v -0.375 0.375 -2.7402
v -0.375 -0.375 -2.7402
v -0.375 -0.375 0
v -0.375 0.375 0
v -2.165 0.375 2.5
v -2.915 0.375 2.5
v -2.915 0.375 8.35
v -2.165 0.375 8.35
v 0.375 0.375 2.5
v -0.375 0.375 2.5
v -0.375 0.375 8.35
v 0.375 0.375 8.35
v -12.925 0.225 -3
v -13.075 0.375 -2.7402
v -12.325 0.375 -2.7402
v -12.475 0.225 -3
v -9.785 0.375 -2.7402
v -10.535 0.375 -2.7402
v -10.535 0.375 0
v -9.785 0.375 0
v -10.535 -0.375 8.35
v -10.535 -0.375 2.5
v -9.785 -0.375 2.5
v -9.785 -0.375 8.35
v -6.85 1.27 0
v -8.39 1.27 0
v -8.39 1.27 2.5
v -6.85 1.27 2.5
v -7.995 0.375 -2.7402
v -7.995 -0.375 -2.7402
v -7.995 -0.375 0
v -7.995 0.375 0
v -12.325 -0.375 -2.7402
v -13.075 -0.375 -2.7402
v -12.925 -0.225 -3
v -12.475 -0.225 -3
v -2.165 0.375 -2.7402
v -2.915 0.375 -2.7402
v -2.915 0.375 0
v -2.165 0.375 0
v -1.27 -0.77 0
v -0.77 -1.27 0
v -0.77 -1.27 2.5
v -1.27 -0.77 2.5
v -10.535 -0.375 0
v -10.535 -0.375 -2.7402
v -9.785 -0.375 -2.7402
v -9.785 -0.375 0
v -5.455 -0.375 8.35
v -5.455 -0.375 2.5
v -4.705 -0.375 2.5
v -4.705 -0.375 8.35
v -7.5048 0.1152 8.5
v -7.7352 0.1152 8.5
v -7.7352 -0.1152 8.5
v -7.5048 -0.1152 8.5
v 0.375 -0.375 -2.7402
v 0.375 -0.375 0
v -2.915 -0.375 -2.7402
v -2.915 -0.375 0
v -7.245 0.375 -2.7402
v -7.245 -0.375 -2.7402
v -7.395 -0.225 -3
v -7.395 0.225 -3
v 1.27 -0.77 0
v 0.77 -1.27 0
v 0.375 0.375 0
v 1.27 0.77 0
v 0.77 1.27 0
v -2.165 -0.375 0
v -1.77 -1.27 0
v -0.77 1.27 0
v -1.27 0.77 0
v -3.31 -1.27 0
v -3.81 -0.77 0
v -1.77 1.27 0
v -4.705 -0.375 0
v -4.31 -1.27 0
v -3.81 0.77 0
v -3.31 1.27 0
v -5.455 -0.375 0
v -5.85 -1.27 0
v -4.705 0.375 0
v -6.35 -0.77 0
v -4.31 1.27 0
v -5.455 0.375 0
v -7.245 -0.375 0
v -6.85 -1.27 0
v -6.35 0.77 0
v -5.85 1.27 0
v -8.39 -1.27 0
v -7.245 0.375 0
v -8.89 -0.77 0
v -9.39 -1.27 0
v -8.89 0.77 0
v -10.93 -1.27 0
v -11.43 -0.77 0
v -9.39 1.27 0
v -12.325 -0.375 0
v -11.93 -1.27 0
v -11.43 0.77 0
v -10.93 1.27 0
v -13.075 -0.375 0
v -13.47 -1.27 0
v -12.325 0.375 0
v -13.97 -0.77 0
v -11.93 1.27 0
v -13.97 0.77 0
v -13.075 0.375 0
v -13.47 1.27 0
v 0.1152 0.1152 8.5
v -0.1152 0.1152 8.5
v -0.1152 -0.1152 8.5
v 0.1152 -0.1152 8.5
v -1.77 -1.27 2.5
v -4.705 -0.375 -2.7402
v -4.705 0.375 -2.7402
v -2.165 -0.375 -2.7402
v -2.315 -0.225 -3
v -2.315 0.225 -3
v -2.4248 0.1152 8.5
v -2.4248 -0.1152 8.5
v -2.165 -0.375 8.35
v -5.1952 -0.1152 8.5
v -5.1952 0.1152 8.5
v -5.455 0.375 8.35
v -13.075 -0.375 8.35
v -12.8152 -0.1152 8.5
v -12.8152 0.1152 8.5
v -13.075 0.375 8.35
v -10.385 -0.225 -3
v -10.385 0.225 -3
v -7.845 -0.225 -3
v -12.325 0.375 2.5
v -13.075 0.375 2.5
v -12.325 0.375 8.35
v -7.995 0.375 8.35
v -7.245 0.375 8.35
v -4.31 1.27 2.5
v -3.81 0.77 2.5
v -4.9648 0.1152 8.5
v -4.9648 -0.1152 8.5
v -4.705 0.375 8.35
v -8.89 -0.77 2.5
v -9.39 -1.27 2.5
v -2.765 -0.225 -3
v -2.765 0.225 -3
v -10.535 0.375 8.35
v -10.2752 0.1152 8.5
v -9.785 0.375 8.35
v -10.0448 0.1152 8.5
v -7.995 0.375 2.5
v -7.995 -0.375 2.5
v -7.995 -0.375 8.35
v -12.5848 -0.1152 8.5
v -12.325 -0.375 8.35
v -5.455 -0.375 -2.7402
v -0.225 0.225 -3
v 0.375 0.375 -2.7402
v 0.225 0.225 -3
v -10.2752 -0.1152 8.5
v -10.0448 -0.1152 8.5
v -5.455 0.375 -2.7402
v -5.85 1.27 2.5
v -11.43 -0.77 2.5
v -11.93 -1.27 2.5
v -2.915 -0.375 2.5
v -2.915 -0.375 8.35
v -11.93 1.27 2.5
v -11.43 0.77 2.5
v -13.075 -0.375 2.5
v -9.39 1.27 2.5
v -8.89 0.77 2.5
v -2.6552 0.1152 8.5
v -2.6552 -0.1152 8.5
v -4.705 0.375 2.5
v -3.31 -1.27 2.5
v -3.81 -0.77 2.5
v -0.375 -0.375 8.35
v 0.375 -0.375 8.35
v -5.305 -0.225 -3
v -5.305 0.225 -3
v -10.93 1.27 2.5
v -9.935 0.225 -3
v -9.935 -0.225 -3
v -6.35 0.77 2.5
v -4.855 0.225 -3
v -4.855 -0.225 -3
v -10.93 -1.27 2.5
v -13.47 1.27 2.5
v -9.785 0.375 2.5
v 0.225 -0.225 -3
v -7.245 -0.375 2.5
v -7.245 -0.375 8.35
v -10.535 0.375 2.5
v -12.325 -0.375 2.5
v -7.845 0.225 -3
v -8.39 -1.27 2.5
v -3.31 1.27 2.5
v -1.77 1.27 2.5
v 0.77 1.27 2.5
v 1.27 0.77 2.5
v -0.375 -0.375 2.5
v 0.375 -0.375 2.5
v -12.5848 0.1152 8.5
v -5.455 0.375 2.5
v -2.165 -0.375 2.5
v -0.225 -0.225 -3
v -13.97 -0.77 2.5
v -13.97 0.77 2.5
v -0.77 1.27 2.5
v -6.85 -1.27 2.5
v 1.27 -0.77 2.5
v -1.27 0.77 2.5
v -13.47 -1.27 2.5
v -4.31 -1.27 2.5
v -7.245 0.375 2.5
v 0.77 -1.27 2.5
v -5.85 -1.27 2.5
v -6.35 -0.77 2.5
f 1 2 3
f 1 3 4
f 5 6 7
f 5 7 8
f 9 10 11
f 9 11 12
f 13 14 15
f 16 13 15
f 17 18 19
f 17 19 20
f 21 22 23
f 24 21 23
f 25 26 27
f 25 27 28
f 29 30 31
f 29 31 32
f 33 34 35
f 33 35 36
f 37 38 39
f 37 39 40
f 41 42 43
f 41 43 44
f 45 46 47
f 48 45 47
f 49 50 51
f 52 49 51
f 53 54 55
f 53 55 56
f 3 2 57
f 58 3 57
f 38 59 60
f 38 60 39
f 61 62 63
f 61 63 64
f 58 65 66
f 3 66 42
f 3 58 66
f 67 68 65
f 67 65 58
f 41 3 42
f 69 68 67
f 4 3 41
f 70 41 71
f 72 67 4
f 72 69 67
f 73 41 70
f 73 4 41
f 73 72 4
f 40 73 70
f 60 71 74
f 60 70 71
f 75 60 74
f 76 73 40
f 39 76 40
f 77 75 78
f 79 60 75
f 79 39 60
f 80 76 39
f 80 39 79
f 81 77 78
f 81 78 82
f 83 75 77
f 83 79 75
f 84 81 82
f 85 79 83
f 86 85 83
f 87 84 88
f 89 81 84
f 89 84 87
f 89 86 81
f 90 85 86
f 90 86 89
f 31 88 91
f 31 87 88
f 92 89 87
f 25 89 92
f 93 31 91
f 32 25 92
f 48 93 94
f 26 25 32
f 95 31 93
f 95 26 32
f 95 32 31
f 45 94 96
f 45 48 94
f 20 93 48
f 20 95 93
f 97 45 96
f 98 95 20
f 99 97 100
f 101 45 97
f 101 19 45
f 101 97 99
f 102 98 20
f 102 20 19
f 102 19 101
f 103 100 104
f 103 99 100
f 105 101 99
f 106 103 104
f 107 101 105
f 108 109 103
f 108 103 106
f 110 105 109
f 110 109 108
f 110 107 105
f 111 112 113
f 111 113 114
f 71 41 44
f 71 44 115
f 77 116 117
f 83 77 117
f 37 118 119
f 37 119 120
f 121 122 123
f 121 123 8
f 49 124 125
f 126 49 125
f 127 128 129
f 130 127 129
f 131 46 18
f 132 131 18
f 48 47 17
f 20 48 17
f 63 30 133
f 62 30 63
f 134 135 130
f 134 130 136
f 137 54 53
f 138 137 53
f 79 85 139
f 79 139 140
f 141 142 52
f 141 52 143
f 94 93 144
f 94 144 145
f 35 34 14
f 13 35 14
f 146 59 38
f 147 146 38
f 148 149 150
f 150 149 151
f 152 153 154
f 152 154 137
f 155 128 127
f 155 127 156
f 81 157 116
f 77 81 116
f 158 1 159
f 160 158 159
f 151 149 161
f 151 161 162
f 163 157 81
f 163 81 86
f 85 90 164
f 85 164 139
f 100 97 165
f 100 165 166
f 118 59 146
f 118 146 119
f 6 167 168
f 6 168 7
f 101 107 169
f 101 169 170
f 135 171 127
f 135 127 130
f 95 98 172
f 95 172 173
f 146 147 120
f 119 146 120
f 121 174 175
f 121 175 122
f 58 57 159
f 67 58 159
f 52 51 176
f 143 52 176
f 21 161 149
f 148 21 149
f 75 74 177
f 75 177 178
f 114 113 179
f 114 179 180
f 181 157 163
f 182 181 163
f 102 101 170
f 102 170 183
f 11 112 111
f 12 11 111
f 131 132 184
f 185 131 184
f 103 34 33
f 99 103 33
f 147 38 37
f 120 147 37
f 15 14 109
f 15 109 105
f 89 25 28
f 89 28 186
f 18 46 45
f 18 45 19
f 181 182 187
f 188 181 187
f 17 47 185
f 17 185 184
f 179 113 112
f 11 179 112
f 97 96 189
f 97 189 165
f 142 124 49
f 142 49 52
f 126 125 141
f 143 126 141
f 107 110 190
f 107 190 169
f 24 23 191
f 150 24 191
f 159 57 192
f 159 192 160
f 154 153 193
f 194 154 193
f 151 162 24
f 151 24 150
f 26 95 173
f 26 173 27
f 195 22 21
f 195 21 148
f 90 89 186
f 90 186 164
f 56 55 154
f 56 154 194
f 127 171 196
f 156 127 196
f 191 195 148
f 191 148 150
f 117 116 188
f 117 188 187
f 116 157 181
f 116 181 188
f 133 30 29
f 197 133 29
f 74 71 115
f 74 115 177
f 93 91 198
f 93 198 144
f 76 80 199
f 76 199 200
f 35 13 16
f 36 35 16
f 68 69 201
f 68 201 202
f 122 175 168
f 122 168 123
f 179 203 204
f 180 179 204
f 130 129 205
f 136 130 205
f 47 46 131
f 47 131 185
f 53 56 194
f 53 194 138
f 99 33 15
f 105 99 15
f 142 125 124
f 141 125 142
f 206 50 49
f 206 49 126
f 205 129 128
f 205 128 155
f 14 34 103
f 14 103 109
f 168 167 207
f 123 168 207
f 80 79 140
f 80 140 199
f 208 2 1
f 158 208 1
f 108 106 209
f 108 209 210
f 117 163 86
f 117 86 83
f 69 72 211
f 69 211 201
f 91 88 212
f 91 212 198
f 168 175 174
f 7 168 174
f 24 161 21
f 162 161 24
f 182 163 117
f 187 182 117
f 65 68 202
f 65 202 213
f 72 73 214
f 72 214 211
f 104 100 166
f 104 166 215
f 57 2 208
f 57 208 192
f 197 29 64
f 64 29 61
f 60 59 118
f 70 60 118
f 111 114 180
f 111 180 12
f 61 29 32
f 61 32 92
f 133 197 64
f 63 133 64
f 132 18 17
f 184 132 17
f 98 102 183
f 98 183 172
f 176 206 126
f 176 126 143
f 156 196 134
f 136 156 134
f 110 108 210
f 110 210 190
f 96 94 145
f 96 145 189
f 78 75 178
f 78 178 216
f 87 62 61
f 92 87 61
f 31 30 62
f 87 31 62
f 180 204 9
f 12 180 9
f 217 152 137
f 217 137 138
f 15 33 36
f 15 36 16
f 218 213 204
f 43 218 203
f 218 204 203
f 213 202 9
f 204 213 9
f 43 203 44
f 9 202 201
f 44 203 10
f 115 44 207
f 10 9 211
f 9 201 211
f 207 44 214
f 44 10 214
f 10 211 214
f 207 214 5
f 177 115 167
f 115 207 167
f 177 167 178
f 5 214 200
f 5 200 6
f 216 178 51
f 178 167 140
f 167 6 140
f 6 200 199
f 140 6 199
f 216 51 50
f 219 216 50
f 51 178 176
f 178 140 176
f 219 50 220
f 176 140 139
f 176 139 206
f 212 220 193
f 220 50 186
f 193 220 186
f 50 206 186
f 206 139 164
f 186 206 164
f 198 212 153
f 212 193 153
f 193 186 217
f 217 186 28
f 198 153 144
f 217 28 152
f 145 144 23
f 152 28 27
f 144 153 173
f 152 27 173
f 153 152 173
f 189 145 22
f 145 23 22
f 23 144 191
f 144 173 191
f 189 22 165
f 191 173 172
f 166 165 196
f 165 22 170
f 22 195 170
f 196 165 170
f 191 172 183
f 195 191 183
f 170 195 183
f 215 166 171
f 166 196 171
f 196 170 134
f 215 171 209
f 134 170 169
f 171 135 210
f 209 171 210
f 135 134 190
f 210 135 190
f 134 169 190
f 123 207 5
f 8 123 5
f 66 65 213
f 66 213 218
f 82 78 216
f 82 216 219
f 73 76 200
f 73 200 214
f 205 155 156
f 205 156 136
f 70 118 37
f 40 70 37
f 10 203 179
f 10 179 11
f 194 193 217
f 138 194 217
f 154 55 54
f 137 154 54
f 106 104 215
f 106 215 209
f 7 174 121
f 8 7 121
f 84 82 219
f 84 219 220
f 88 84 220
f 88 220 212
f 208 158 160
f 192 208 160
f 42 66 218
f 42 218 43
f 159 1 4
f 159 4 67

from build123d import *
from OCP.BRepFilletAPI import BRepFilletAPI_MakeChamfer

# Parameters (mm, degrees)
SKICA1_W                     = 0.75
SKICA1_H                     = 0.75
P_IDAT_VYSUNUT_M1_DEPTH      = 2.5
LINPOLE3_COUNT               = 6
LINPOLE3_PITCH               = 2.54
P_IDAT_VYSUNUT_M2_DEPTH      = 6
P_IDAT_VYSUNUT_M2_DEPTH_BACK = 5.5
SKICA2_W                     = 0.75
SKICA2_H                     = 0.75
ZKOSEN_2_SIZE                = 0.15
ZKOSEN_2_SIZE2               = 0.259807621


with BuildPart() as part:
    # Skica1 → Přidat vysunutím1 (new body)
    with BuildSketch(Plane.XY):
        Polygon((0.77, 1.27), (1.27, 0.77), (1.27, -0.77), (0.77, -1.27), (-0.77, -1.27), (-1.27, -0.77), (-1.27, 0.77), (-0.77, 1.27), align=None)
        Rectangle(SKICA1_W, SKICA1_H, mode=Mode.SUBTRACT)
    p_idat_vysunut_m1 = extrude(amount=P_IDAT_VYSUNUT_M1_DEPTH)

    # LinPole3: Přidat vysunutím1 ×6
    with Locations(*[(-i * LINPOLE3_PITCH, 0, 0) for i in range(1, LINPOLE3_COUNT)]):
        add(p_idat_vysunut_m1)

    # Skica2 → Přidat vysunutím2 (add, two sides: drawn at the far end of the back side and taken through both)
    with BuildSketch(Plane.XY.offset(2.5).offset(-P_IDAT_VYSUNUT_M2_DEPTH_BACK)):
        with Locations((-12.7, 0)):
            Rectangle(SKICA2_W, SKICA2_H)
        with Locations((-10.16, 0)):
            Rectangle(SKICA2_W, SKICA2_H)
        with Locations((-7.62, 0)):
            Rectangle(SKICA2_W, SKICA2_H)
        with Locations((-5.08, 0)):
            Rectangle(SKICA2_W, SKICA2_H)
        with Locations((-2.54, 0)):
            Rectangle(SKICA2_W, SKICA2_H)
        Rectangle(SKICA2_W, SKICA2_H)
    extrude(amount=P_IDAT_VYSUNUT_M2_DEPTH + P_IDAT_VYSUNUT_M2_DEPTH_BACK)

    # Zkosení2: one chamfer whose edges measure the first distance from different faces: ONE call of the kernel's chamfer builder (chamfer() names one face for all edges)
    zkosen_2_edges_1 = [part.edges().sort_by_distance(p)[0] for p in [
        (0, 0.375, -3),
        (0.375, 0, -3),
        (0, -0.375, -3),
        (-0.375, 0, -3),
    ]]
    zkosen_2_side_1 = [part.faces().sort_by_distance(p)[0] for p in [
        (0, 0, -3),
    ]]
    zkosen_2_edges_2 = [part.edges().sort_by_distance(p)[0] for p in [
        (0, 0.375, 8.5),
    ]]
    zkosen_2_side_2 = [part.faces().sort_by_distance(p)[0] for p in [
        (0, 0.375, 5.5),
    ]]
    zkosen_2_edges_3 = [part.edges().sort_by_distance(p)[0] for p in [
        (-0.375, 0, 8.5),
    ]]
    zkosen_2_side_3 = [part.faces().sort_by_distance(p)[0] for p in [
        (-0.375, 0, 5.5),
    ]]
    zkosen_2_edges_4 = [part.edges().sort_by_distance(p)[0] for p in [
        (0, -0.375, 8.5),
    ]]
    zkosen_2_side_4 = [part.faces().sort_by_distance(p)[0] for p in [
        (0, -0.375, 5.5),
    ]]
    zkosen_2_edges_5 = [part.edges().sort_by_distance(p)[0] for p in [
        (0.375, 0, 8.5),
    ]]
    zkosen_2_side_5 = [part.faces().sort_by_distance(p)[0] for p in [
        (0.375, 0, 5.5),
    ]]
    zkosen_2_edges_6 = [part.edges().sort_by_distance(p)[0] for p in [
        (-2.54, 0.375, -3),
        (-2.165, 0, -3),
        (-2.54, -0.375, -3),
        (-2.915, 0, -3),
    ]]
    zkosen_2_side_6 = [part.faces().sort_by_distance(p)[0] for p in [
        (-2.54, 0, -3),
    ]]
    zkosen_2_edges_7 = [part.edges().sort_by_distance(p)[0] for p in [
        (-2.54, 0.375, 8.5),
    ]]
    zkosen_2_side_7 = [part.faces().sort_by_distance(p)[0] for p in [
        (-2.54, 0.375, 5.5),
    ]]
    zkosen_2_edges_8 = [part.edges().sort_by_distance(p)[0] for p in [
        (-2.915, 0, 8.5),
    ]]
    zkosen_2_side_8 = [part.faces().sort_by_distance(p)[0] for p in [
        (-2.915, 0, 5.5),
    ]]
    zkosen_2_edges_9 = [part.edges().sort_by_distance(p)[0] for p in [
        (-2.54, -0.375, 8.5),
    ]]
    zkosen_2_side_9 = [part.faces().sort_by_distance(p)[0] for p in [
        (-2.54, -0.375, 5.5),
    ]]
    zkosen_2_edges_10 = [part.edges().sort_by_distance(p)[0] for p in [
        (-2.165, 0, 8.5),
    ]]
    zkosen_2_side_10 = [part.faces().sort_by_distance(p)[0] for p in [
        (-2.165, 0, 5.5),
    ]]
    zkosen_2_edges_11 = [part.edges().sort_by_distance(p)[0] for p in [
        (-5.08, 0.375, -3),
        (-4.705, 0, -3),
        (-5.08, -0.375, -3),
        (-5.455, 0, -3),
    ]]
    zkosen_2_side_11 = [part.faces().sort_by_distance(p)[0] for p in [
        (-5.08, 0, -3),
    ]]
    zkosen_2_edges_12 = [part.edges().sort_by_distance(p)[0] for p in [
        (-5.08, 0.375, 8.5),
    ]]
    zkosen_2_side_12 = [part.faces().sort_by_distance(p)[0] for p in [
        (-5.08, 0.375, 5.5),
    ]]
    zkosen_2_edges_13 = [part.edges().sort_by_distance(p)[0] for p in [
        (-5.455, 0, 8.5),
    ]]
    zkosen_2_side_13 = [part.faces().sort_by_distance(p)[0] for p in [
        (-5.455, 0, 5.5),
    ]]
    zkosen_2_edges_14 = [part.edges().sort_by_distance(p)[0] for p in [
        (-5.08, -0.375, 8.5),
    ]]
    zkosen_2_side_14 = [part.faces().sort_by_distance(p)[0] for p in [
        (-5.08, -0.375, 5.5),
    ]]
    zkosen_2_edges_15 = [part.edges().sort_by_distance(p)[0] for p in [
        (-4.705, 0, 8.5),
    ]]
    zkosen_2_side_15 = [part.faces().sort_by_distance(p)[0] for p in [
        (-4.705, 0, 5.5),
    ]]
    zkosen_2_edges_16 = [part.edges().sort_by_distance(p)[0] for p in [
        (-7.62, 0.375, -3),
        (-7.245, 0, -3),
        (-7.62, -0.375, -3),
        (-7.995, 0, -3),
    ]]
    zkosen_2_side_16 = [part.faces().sort_by_distance(p)[0] for p in [
        (-7.62, 0, -3),
    ]]
    zkosen_2_edges_17 = [part.edges().sort_by_distance(p)[0] for p in [
        (-7.62, 0.375, 8.5),
    ]]
    zkosen_2_side_17 = [part.faces().sort_by_distance(p)[0] for p in [
        (-7.62, 0.375, 5.5),
    ]]
    zkosen_2_edges_18 = [part.edges().sort_by_distance(p)[0] for p in [
        (-7.995, 0, 8.5),
    ]]
    zkosen_2_side_18 = [part.faces().sort_by_distance(p)[0] for p in [
        (-7.995, 0, 5.5),
    ]]
    zkosen_2_edges_19 = [part.edges().sort_by_distance(p)[0] for p in [
        (-7.62, -0.375, 8.5),
    ]]
    zkosen_2_side_19 = [part.faces().sort_by_distance(p)[0] for p in [
        (-7.62, -0.375, 5.5),
    ]]
    zkosen_2_edges_20 = [part.edges().sort_by_distance(p)[0] for p in [
        (-7.245, 0, 8.5),
    ]]
    zkosen_2_side_20 = [part.faces().sort_by_distance(p)[0] for p in [
        (-7.245, 0, 5.5),
    ]]
    zkosen_2_edges_21 = [part.edges().sort_by_distance(p)[0] for p in [
        (-10.16, 0.375, -3),
        (-9.785, 0, -3),
        (-10.16, -0.375, -3),
        (-10.535, 0, -3),
    ]]
    zkosen_2_side_21 = [part.faces().sort_by_distance(p)[0] for p in [
        (-10.16, 0, -3),
    ]]
    zkosen_2_edges_22 = [part.edges().sort_by_distance(p)[0] for p in [
        (-10.16, 0.375, 8.5),
    ]]
    zkosen_2_side_22 = [part.faces().sort_by_distance(p)[0] for p in [
        (-10.16, 0.375, 5.5),
    ]]
    zkosen_2_edges_23 = [part.edges().sort_by_distance(p)[0] for p in [
        (-10.535, 0, 8.5),
    ]]
    zkosen_2_side_23 = [part.faces().sort_by_distance(p)[0] for p in [
        (-10.535, 0, 5.5),
    ]]
    zkosen_2_edges_24 = [part.edges().sort_by_distance(p)[0] for p in [
        (-10.16, -0.375, 8.5),
    ]]
    zkosen_2_side_24 = [part.faces().sort_by_distance(p)[0] for p in [
        (-10.16, -0.375, 5.5),
    ]]
    zkosen_2_edges_25 = [part.edges().sort_by_distance(p)[0] for p in [
        (-9.785, 0, 8.5),
    ]]
    zkosen_2_side_25 = [part.faces().sort_by_distance(p)[0] for p in [
        (-9.785, 0, 5.5),
    ]]
    zkosen_2_edges_26 = [part.edges().sort_by_distance(p)[0] for p in [
        (-12.7, 0.375, -3),
        (-12.325, 0, -3),
        (-12.7, -0.375, -3),
        (-13.075, 0, -3),
    ]]
    zkosen_2_side_26 = [part.faces().sort_by_distance(p)[0] for p in [
        (-12.7, 0, -3),
    ]]
    zkosen_2_edges_27 = [part.edges().sort_by_distance(p)[0] for p in [
        (-12.7, 0.375, 8.5),
    ]]
    zkosen_2_side_27 = [part.faces().sort_by_distance(p)[0] for p in [
        (-12.7, 0.375, 5.5),
    ]]
    zkosen_2_edges_28 = [part.edges().sort_by_distance(p)[0] for p in [
        (-13.075, 0, 8.5),
    ]]
    zkosen_2_side_28 = [part.faces().sort_by_distance(p)[0] for p in [
        (-13.075, 0, 5.5),
    ]]
    zkosen_2_edges_29 = [part.edges().sort_by_distance(p)[0] for p in [
        (-12.7, -0.375, 8.5),
    ]]
    zkosen_2_side_29 = [part.faces().sort_by_distance(p)[0] for p in [
        (-12.7, -0.375, 5.5),
    ]]
    zkosen_2_edges_30 = [part.edges().sort_by_distance(p)[0] for p in [
        (-12.325, 0, 8.5),
    ]]
    zkosen_2_side_30 = [part.faces().sort_by_distance(p)[0] for p in [
        (-12.325, 0, 5.5),
    ]]
    zkosen_2 = BRepFilletAPI_MakeChamfer(part.part.solid().wrapped)
    for e in zkosen_2_edges_1:
        zkosen_2.Add(ZKOSEN_2_SIZE, ZKOSEN_2_SIZE2, e.wrapped, zkosen_2_side_1[0].wrapped)  # the first distance lies on this face
    for e in zkosen_2_edges_2:
        zkosen_2.Add(ZKOSEN_2_SIZE, ZKOSEN_2_SIZE2, e.wrapped, zkosen_2_side_2[0].wrapped)  # the first distance lies on this face
    for e in zkosen_2_edges_3:
        zkosen_2.Add(ZKOSEN_2_SIZE, ZKOSEN_2_SIZE2, e.wrapped, zkosen_2_side_3[0].wrapped)  # the first distance lies on this face
    for e in zkosen_2_edges_4:
        zkosen_2.Add(ZKOSEN_2_SIZE, ZKOSEN_2_SIZE2, e.wrapped, zkosen_2_side_4[0].wrapped)  # the first distance lies on this face
    for e in zkosen_2_edges_5:
        zkosen_2.Add(ZKOSEN_2_SIZE, ZKOSEN_2_SIZE2, e.wrapped, zkosen_2_side_5[0].wrapped)  # the first distance lies on this face
    for e in zkosen_2_edges_6:
        zkosen_2.Add(ZKOSEN_2_SIZE, ZKOSEN_2_SIZE2, e.wrapped, zkosen_2_side_6[0].wrapped)  # the first distance lies on this face
    for e in zkosen_2_edges_7:
        zkosen_2.Add(ZKOSEN_2_SIZE, ZKOSEN_2_SIZE2, e.wrapped, zkosen_2_side_7[0].wrapped)  # the first distance lies on this face
    for e in zkosen_2_edges_8:
        zkosen_2.Add(ZKOSEN_2_SIZE, ZKOSEN_2_SIZE2, e.wrapped, zkosen_2_side_8[0].wrapped)  # the first distance lies on this face
    for e in zkosen_2_edges_9:
        zkosen_2.Add(ZKOSEN_2_SIZE, ZKOSEN_2_SIZE2, e.wrapped, zkosen_2_side_9[0].wrapped)  # the first distance lies on this face
    for e in zkosen_2_edges_10:
        zkosen_2.Add(ZKOSEN_2_SIZE, ZKOSEN_2_SIZE2, e.wrapped, zkosen_2_side_10[0].wrapped)  # the first distance lies on this face
    for e in zkosen_2_edges_11:
        zkosen_2.Add(ZKOSEN_2_SIZE, ZKOSEN_2_SIZE2, e.wrapped, zkosen_2_side_11[0].wrapped)  # the first distance lies on this face
    for e in zkosen_2_edges_12:
        zkosen_2.Add(ZKOSEN_2_SIZE, ZKOSEN_2_SIZE2, e.wrapped, zkosen_2_side_12[0].wrapped)  # the first distance lies on this face
    for e in zkosen_2_edges_13:
        zkosen_2.Add(ZKOSEN_2_SIZE, ZKOSEN_2_SIZE2, e.wrapped, zkosen_2_side_13[0].wrapped)  # the first distance lies on this face
    for e in zkosen_2_edges_14:
        zkosen_2.Add(ZKOSEN_2_SIZE, ZKOSEN_2_SIZE2, e.wrapped, zkosen_2_side_14[0].wrapped)  # the first distance lies on this face
    for e in zkosen_2_edges_15:
        zkosen_2.Add(ZKOSEN_2_SIZE, ZKOSEN_2_SIZE2, e.wrapped, zkosen_2_side_15[0].wrapped)  # the first distance lies on this face
    for e in zkosen_2_edges_16:
        zkosen_2.Add(ZKOSEN_2_SIZE, ZKOSEN_2_SIZE2, e.wrapped, zkosen_2_side_16[0].wrapped)  # the first distance lies on this face
    for e in zkosen_2_edges_17:
        zkosen_2.Add(ZKOSEN_2_SIZE, ZKOSEN_2_SIZE2, e.wrapped, zkosen_2_side_17[0].wrapped)  # the first distance lies on this face
    for e in zkosen_2_edges_18:
        zkosen_2.Add(ZKOSEN_2_SIZE, ZKOSEN_2_SIZE2, e.wrapped, zkosen_2_side_18[0].wrapped)  # the first distance lies on this face
    for e in zkosen_2_edges_19:
        zkosen_2.Add(ZKOSEN_2_SIZE, ZKOSEN_2_SIZE2, e.wrapped, zkosen_2_side_19[0].wrapped)  # the first distance lies on this face
    for e in zkosen_2_edges_20:
        zkosen_2.Add(ZKOSEN_2_SIZE, ZKOSEN_2_SIZE2, e.wrapped, zkosen_2_side_20[0].wrapped)  # the first distance lies on this face
    for e in zkosen_2_edges_21:
        zkosen_2.Add(ZKOSEN_2_SIZE, ZKOSEN_2_SIZE2, e.wrapped, zkosen_2_side_21[0].wrapped)  # the first distance lies on this face
    for e in zkosen_2_edges_22:
        zkosen_2.Add(ZKOSEN_2_SIZE, ZKOSEN_2_SIZE2, e.wrapped, zkosen_2_side_22[0].wrapped)  # the first distance lies on this face
    for e in zkosen_2_edges_23:
        zkosen_2.Add(ZKOSEN_2_SIZE, ZKOSEN_2_SIZE2, e.wrapped, zkosen_2_side_23[0].wrapped)  # the first distance lies on this face
    for e in zkosen_2_edges_24:
        zkosen_2.Add(ZKOSEN_2_SIZE, ZKOSEN_2_SIZE2, e.wrapped, zkosen_2_side_24[0].wrapped)  # the first distance lies on this face
    for e in zkosen_2_edges_25:
        zkosen_2.Add(ZKOSEN_2_SIZE, ZKOSEN_2_SIZE2, e.wrapped, zkosen_2_side_25[0].wrapped)  # the first distance lies on this face
    for e in zkosen_2_edges_26:
        zkosen_2.Add(ZKOSEN_2_SIZE, ZKOSEN_2_SIZE2, e.wrapped, zkosen_2_side_26[0].wrapped)  # the first distance lies on this face
    for e in zkosen_2_edges_27:
        zkosen_2.Add(ZKOSEN_2_SIZE, ZKOSEN_2_SIZE2, e.wrapped, zkosen_2_side_27[0].wrapped)  # the first distance lies on this face
    for e in zkosen_2_edges_28:
        zkosen_2.Add(ZKOSEN_2_SIZE, ZKOSEN_2_SIZE2, e.wrapped, zkosen_2_side_28[0].wrapped)  # the first distance lies on this face
    for e in zkosen_2_edges_29:
        zkosen_2.Add(ZKOSEN_2_SIZE, ZKOSEN_2_SIZE2, e.wrapped, zkosen_2_side_29[0].wrapped)  # the first distance lies on this face
    for e in zkosen_2_edges_30:
        zkosen_2.Add(ZKOSEN_2_SIZE, ZKOSEN_2_SIZE2, e.wrapped, zkosen_2_side_30[0].wrapped)  # the first distance lies on this face
    add(Compound.cast(zkosen_2.Shape()), mode=Mode.REPLACE)


solid = part.part
